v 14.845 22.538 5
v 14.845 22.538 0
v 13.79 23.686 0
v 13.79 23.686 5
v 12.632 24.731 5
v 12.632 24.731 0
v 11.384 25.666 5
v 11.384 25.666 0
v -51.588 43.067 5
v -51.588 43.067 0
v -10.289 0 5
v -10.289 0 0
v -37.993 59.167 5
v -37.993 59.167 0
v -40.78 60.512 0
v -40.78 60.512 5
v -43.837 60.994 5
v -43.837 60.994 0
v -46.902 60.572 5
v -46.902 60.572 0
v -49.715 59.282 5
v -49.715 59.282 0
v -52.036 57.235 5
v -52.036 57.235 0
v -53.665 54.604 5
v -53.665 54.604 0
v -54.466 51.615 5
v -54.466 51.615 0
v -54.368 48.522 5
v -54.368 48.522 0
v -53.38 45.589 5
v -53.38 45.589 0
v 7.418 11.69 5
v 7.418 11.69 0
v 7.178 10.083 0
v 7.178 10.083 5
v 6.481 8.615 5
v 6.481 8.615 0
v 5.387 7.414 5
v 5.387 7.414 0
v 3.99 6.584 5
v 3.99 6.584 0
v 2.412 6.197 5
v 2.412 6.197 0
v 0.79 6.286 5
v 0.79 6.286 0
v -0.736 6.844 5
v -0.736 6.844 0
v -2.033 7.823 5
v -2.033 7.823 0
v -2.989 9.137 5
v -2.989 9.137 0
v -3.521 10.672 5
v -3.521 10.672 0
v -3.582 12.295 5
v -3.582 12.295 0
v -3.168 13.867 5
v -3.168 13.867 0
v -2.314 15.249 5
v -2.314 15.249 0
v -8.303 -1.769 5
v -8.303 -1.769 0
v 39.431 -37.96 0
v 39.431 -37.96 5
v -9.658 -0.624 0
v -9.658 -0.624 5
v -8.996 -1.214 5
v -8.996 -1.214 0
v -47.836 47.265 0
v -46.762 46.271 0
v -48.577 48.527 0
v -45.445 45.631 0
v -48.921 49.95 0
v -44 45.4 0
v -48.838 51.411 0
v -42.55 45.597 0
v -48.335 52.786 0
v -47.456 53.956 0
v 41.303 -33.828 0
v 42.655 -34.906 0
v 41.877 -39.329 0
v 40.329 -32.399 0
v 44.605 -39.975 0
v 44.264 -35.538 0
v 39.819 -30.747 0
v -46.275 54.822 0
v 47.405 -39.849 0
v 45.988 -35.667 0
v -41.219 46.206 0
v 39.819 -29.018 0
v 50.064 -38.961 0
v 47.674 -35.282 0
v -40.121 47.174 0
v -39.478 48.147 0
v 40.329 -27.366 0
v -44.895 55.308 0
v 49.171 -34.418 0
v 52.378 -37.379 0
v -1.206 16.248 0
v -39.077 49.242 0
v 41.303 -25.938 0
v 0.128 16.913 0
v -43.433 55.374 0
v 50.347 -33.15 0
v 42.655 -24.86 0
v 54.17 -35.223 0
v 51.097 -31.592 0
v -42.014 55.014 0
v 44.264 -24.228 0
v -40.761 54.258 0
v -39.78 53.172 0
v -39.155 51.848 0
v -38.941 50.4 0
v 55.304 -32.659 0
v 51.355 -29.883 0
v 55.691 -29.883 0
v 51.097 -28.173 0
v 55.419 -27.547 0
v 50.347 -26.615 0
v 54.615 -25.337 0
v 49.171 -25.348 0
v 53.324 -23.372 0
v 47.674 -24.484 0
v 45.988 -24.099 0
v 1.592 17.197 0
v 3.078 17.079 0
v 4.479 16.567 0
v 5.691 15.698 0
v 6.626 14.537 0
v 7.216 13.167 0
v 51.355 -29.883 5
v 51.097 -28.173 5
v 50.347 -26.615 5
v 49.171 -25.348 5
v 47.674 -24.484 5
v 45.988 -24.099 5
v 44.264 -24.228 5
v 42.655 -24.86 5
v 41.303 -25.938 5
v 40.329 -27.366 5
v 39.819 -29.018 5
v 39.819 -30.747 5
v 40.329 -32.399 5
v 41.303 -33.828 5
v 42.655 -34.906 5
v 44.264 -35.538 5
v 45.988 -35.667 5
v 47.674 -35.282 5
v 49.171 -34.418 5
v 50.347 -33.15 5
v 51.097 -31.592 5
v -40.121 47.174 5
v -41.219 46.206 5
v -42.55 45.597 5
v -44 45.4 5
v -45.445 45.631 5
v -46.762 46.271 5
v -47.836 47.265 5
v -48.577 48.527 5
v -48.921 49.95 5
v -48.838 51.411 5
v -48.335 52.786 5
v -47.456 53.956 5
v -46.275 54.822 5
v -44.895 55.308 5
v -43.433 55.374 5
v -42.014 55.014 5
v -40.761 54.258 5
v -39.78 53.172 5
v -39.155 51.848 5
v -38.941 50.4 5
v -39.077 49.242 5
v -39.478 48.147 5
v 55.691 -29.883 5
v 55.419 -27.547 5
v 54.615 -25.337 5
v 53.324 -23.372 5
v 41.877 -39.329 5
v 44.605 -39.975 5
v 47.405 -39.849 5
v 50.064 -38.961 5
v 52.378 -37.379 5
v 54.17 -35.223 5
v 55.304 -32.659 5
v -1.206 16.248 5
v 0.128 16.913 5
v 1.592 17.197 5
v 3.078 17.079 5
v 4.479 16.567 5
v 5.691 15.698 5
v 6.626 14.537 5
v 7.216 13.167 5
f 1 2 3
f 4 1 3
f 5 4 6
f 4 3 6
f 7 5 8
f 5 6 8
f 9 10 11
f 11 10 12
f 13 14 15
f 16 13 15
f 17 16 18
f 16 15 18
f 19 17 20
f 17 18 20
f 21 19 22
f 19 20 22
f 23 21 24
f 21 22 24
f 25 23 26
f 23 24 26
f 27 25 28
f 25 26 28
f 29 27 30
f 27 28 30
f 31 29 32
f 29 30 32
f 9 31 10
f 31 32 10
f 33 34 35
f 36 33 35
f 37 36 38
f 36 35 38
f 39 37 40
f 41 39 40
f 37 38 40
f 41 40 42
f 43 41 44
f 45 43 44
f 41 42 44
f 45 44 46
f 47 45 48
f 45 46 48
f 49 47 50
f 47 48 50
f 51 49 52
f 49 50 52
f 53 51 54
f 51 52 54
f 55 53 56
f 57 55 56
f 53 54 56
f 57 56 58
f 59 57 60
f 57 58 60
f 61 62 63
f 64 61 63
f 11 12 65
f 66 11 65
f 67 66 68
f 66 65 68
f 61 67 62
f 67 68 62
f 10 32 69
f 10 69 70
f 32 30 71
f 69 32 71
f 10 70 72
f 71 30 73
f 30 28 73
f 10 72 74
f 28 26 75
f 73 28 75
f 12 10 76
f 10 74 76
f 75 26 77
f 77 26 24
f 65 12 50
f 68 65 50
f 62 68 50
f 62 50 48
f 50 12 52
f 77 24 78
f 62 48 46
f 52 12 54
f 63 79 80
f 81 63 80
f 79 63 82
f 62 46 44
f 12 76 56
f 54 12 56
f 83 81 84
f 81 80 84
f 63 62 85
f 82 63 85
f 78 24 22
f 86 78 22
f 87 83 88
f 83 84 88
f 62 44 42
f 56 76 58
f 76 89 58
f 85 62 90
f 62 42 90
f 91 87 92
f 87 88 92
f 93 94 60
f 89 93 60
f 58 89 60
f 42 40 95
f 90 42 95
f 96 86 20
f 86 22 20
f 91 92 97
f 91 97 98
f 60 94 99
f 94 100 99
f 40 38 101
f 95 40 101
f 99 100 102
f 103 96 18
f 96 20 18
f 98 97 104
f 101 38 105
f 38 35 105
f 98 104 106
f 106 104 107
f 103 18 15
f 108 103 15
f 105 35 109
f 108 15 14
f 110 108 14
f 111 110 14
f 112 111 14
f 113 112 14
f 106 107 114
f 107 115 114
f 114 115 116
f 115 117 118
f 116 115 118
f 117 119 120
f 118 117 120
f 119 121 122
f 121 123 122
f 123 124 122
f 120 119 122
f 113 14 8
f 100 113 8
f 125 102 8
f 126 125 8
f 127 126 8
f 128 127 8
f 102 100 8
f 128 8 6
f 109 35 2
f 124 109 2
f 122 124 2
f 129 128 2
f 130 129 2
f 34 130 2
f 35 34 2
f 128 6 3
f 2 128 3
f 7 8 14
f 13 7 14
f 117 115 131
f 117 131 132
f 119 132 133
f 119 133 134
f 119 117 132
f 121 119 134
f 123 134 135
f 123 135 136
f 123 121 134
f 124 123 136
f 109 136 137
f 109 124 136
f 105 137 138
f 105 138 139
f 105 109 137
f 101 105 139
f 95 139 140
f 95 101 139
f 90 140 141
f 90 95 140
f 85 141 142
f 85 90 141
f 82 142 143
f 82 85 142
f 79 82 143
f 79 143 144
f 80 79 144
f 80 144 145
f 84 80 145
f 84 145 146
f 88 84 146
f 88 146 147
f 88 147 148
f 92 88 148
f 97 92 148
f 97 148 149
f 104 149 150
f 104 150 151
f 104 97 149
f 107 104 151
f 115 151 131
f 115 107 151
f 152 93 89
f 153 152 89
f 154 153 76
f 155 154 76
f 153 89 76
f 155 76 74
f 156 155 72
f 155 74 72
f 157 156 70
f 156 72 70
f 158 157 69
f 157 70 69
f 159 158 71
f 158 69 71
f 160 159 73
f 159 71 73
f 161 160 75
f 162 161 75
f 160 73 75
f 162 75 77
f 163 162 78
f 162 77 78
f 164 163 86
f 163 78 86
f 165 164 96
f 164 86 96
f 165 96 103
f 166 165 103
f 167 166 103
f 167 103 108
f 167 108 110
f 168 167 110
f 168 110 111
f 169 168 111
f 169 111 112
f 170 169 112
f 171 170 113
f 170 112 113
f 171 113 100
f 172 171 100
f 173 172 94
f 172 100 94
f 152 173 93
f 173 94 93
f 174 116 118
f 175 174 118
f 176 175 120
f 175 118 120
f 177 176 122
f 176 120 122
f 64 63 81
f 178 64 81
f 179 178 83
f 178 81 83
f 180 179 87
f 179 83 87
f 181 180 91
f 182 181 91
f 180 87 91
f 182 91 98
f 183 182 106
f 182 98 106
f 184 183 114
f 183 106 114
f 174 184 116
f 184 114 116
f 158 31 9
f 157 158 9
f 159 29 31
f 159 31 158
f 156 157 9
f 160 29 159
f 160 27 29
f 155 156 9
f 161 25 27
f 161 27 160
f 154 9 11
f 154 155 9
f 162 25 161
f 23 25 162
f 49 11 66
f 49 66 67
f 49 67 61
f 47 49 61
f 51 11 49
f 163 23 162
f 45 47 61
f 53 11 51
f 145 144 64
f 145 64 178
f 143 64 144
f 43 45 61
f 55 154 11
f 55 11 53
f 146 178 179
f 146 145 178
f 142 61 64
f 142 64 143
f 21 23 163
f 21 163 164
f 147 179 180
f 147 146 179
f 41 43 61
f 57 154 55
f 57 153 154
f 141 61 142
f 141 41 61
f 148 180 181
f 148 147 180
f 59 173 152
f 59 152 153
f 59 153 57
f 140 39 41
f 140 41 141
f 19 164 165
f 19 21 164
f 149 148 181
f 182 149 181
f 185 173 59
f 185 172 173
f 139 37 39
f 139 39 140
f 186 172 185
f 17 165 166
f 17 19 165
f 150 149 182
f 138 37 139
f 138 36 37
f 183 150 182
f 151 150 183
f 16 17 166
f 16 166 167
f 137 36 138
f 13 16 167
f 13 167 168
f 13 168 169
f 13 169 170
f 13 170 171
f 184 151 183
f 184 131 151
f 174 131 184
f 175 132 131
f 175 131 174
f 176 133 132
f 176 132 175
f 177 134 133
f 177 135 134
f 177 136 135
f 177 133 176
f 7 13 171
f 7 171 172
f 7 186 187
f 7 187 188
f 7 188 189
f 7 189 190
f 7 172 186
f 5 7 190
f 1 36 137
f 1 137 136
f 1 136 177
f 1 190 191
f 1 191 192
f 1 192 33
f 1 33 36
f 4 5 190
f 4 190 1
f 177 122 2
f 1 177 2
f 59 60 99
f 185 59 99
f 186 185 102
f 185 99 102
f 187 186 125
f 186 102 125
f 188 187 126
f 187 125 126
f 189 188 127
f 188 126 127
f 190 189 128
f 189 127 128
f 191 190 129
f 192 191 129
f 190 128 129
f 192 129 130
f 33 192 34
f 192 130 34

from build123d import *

# Parameters (mm, degrees)
F0_R     = 5.8001703578
F1_DEPTH = 5


with BuildPart() as f1:
    # F0 (on Top) → F1 (new body)
    with BuildSketch(Plane.XY):
        with BuildLine():
            ThreePointArc((-51.5878325652, 43.0670979278), (-43.6064509364, 39.8107528074), (-35.8466573247, 43.5646626824))
            ThreePointArc((-35.8466573247, 43.5646626824), (-33.9913764501, 46.7608427975), (-33.3468052575, 50.3998210098))
            ThreePointArc((-33.3468052575, 50.3998210098), (-34.5801317872, 55.3608197394), (-37.9929595743, 59.1667636721))
            ThreePointArc((-37.9929595743, 59.1667636721), (-52.0356668806, 57.2349793372), (-51.5878325652, 43.0670979278))
        make_face()
        with BuildLine():
            ThreePointArc((-40.1209657017, 47.1739723683), (-48.6369571368, 52.1172344713), (-38.9411621027, 50.3998210098))
            ThreePointArc((-38.9411621027, 50.3998210098), (-39.2453670685, 48.6824075484), (-40.1209657017, 47.1739723683))
        make_face(mode=Mode.SUBTRACT)
        with BuildLine():
            ThreePointArc((-33.3468052575, 50.3998210098), (-33.9913764501, 46.7608427975), (-35.8466573247, 43.5646626824))
            Line((-35.8466573247, 43.5646626824), (-11.0028552614, 22.586069771))
            ThreePointArc((-11.0028552614, 22.586069771), (-0.4004973799, 28.421312646), (11.3836651948, 25.6656703485))
            Line((11.3836651948, 25.6656703485), (-37.9929595743, 59.1667636721))
            ThreePointArc((-37.9929595743, 59.1667636721), (-34.5801317872, 55.3608197394), (-33.3468052575, 50.3998210098))
        make_face()
        with BuildLine():
            Line((-11.0028552614, 22.586069771), (-35.8466573247, 43.5646626824))
            ThreePointArc((-35.8466573247, 43.5646626824), (-43.6064509364, 39.8107528074), (-51.5878325652, 43.0670979278))
            Line((-51.5878325652, 43.0670979278), (-10.2889293891, 0))
            ThreePointArc((-10.2889293891, 0), (-14.9796236946, 11.1560494348), (-11.0028552614, 22.586069771))
        make_face()
        with BuildLine():
            ThreePointArc((11.3836651948, 25.6656703485), (-0.4004973799, 28.421312646), (-11.0028552614, 22.586069771))
            ThreePointArc((-11.0028552614, 22.586069771), (-14.9796236946, 11.1560494348), (-10.2889293891, 0))
            ThreePointArc((-10.2889293891, 0), (-9.3307459574, -0.923461232), (-8.3028313172, -1.7686166191))
            ThreePointArc((-8.3028313172, -1.7686166191), (9.4147958872, -3.4362525243), (18.7904441289, 11.6896373111))
            ThreePointArc((18.7904441289, 11.6896373111), (17.7735553067, 17.4615447103), (14.8453410404, 22.5384078277))
            ThreePointArc((14.8453410404, 22.5384078277), (13.2229979304, 24.2221357766), (11.3836651948, 25.6656703485))
        make_face()
        with BuildLine():
            ThreePointArc((7.4177247191, 11.6896373111), (0.0063621285, 6.5087384654), (-2.3136509097, 15.2487354792))
            ThreePointArc((-2.3136509097, 15.2487354792), (3.7960272887, 16.8705361568), (7.4177247191, 11.6896373111))
        make_face(mode=Mode.SUBTRACT)
        with BuildLine():
            ThreePointArc((18.7904441289, 11.6896373111), (9.4147958872, -3.4362525243), (-8.3028313172, -1.7686166191))
            Line((-8.3028313172, -1.7686166191), (39.4306997632, -37.9601014858))
            ThreePointArc((39.4306997632, -37.9601014858), (38.2144708977, -22.8923814768), (53.3235958963, -23.3716942143))
            Line((53.3235958963, -23.3716942143), (14.8453410404, 22.5384078277))
            ThreePointArc((14.8453410404, 22.5384078277), (17.7735553067, 17.4615447103), (18.7904441289, 11.6896373111))
        make_face()
        with BuildLine():
            ThreePointArc((53.3235958963, -23.3716942143), (38.2144708977, -22.8923814768), (39.4306997632, -37.9601014858))
            ThreePointArc((39.4306997632, -37.9601014858), (50.0643321154, -38.9609706715), (55.6913382216, -29.8828277773))
            ThreePointArc((55.6913382216, -29.8828277773), (55.0810295299, -26.4186877688), (53.3235958963, -23.3716942143))
        make_face()
        with Locations((45.5548754228, -29.8828277773)):
            Circle(F0_R, mode=Mode.SUBTRACT)
    extrude(amount=F1_DEPTH)


solid = f1.part
